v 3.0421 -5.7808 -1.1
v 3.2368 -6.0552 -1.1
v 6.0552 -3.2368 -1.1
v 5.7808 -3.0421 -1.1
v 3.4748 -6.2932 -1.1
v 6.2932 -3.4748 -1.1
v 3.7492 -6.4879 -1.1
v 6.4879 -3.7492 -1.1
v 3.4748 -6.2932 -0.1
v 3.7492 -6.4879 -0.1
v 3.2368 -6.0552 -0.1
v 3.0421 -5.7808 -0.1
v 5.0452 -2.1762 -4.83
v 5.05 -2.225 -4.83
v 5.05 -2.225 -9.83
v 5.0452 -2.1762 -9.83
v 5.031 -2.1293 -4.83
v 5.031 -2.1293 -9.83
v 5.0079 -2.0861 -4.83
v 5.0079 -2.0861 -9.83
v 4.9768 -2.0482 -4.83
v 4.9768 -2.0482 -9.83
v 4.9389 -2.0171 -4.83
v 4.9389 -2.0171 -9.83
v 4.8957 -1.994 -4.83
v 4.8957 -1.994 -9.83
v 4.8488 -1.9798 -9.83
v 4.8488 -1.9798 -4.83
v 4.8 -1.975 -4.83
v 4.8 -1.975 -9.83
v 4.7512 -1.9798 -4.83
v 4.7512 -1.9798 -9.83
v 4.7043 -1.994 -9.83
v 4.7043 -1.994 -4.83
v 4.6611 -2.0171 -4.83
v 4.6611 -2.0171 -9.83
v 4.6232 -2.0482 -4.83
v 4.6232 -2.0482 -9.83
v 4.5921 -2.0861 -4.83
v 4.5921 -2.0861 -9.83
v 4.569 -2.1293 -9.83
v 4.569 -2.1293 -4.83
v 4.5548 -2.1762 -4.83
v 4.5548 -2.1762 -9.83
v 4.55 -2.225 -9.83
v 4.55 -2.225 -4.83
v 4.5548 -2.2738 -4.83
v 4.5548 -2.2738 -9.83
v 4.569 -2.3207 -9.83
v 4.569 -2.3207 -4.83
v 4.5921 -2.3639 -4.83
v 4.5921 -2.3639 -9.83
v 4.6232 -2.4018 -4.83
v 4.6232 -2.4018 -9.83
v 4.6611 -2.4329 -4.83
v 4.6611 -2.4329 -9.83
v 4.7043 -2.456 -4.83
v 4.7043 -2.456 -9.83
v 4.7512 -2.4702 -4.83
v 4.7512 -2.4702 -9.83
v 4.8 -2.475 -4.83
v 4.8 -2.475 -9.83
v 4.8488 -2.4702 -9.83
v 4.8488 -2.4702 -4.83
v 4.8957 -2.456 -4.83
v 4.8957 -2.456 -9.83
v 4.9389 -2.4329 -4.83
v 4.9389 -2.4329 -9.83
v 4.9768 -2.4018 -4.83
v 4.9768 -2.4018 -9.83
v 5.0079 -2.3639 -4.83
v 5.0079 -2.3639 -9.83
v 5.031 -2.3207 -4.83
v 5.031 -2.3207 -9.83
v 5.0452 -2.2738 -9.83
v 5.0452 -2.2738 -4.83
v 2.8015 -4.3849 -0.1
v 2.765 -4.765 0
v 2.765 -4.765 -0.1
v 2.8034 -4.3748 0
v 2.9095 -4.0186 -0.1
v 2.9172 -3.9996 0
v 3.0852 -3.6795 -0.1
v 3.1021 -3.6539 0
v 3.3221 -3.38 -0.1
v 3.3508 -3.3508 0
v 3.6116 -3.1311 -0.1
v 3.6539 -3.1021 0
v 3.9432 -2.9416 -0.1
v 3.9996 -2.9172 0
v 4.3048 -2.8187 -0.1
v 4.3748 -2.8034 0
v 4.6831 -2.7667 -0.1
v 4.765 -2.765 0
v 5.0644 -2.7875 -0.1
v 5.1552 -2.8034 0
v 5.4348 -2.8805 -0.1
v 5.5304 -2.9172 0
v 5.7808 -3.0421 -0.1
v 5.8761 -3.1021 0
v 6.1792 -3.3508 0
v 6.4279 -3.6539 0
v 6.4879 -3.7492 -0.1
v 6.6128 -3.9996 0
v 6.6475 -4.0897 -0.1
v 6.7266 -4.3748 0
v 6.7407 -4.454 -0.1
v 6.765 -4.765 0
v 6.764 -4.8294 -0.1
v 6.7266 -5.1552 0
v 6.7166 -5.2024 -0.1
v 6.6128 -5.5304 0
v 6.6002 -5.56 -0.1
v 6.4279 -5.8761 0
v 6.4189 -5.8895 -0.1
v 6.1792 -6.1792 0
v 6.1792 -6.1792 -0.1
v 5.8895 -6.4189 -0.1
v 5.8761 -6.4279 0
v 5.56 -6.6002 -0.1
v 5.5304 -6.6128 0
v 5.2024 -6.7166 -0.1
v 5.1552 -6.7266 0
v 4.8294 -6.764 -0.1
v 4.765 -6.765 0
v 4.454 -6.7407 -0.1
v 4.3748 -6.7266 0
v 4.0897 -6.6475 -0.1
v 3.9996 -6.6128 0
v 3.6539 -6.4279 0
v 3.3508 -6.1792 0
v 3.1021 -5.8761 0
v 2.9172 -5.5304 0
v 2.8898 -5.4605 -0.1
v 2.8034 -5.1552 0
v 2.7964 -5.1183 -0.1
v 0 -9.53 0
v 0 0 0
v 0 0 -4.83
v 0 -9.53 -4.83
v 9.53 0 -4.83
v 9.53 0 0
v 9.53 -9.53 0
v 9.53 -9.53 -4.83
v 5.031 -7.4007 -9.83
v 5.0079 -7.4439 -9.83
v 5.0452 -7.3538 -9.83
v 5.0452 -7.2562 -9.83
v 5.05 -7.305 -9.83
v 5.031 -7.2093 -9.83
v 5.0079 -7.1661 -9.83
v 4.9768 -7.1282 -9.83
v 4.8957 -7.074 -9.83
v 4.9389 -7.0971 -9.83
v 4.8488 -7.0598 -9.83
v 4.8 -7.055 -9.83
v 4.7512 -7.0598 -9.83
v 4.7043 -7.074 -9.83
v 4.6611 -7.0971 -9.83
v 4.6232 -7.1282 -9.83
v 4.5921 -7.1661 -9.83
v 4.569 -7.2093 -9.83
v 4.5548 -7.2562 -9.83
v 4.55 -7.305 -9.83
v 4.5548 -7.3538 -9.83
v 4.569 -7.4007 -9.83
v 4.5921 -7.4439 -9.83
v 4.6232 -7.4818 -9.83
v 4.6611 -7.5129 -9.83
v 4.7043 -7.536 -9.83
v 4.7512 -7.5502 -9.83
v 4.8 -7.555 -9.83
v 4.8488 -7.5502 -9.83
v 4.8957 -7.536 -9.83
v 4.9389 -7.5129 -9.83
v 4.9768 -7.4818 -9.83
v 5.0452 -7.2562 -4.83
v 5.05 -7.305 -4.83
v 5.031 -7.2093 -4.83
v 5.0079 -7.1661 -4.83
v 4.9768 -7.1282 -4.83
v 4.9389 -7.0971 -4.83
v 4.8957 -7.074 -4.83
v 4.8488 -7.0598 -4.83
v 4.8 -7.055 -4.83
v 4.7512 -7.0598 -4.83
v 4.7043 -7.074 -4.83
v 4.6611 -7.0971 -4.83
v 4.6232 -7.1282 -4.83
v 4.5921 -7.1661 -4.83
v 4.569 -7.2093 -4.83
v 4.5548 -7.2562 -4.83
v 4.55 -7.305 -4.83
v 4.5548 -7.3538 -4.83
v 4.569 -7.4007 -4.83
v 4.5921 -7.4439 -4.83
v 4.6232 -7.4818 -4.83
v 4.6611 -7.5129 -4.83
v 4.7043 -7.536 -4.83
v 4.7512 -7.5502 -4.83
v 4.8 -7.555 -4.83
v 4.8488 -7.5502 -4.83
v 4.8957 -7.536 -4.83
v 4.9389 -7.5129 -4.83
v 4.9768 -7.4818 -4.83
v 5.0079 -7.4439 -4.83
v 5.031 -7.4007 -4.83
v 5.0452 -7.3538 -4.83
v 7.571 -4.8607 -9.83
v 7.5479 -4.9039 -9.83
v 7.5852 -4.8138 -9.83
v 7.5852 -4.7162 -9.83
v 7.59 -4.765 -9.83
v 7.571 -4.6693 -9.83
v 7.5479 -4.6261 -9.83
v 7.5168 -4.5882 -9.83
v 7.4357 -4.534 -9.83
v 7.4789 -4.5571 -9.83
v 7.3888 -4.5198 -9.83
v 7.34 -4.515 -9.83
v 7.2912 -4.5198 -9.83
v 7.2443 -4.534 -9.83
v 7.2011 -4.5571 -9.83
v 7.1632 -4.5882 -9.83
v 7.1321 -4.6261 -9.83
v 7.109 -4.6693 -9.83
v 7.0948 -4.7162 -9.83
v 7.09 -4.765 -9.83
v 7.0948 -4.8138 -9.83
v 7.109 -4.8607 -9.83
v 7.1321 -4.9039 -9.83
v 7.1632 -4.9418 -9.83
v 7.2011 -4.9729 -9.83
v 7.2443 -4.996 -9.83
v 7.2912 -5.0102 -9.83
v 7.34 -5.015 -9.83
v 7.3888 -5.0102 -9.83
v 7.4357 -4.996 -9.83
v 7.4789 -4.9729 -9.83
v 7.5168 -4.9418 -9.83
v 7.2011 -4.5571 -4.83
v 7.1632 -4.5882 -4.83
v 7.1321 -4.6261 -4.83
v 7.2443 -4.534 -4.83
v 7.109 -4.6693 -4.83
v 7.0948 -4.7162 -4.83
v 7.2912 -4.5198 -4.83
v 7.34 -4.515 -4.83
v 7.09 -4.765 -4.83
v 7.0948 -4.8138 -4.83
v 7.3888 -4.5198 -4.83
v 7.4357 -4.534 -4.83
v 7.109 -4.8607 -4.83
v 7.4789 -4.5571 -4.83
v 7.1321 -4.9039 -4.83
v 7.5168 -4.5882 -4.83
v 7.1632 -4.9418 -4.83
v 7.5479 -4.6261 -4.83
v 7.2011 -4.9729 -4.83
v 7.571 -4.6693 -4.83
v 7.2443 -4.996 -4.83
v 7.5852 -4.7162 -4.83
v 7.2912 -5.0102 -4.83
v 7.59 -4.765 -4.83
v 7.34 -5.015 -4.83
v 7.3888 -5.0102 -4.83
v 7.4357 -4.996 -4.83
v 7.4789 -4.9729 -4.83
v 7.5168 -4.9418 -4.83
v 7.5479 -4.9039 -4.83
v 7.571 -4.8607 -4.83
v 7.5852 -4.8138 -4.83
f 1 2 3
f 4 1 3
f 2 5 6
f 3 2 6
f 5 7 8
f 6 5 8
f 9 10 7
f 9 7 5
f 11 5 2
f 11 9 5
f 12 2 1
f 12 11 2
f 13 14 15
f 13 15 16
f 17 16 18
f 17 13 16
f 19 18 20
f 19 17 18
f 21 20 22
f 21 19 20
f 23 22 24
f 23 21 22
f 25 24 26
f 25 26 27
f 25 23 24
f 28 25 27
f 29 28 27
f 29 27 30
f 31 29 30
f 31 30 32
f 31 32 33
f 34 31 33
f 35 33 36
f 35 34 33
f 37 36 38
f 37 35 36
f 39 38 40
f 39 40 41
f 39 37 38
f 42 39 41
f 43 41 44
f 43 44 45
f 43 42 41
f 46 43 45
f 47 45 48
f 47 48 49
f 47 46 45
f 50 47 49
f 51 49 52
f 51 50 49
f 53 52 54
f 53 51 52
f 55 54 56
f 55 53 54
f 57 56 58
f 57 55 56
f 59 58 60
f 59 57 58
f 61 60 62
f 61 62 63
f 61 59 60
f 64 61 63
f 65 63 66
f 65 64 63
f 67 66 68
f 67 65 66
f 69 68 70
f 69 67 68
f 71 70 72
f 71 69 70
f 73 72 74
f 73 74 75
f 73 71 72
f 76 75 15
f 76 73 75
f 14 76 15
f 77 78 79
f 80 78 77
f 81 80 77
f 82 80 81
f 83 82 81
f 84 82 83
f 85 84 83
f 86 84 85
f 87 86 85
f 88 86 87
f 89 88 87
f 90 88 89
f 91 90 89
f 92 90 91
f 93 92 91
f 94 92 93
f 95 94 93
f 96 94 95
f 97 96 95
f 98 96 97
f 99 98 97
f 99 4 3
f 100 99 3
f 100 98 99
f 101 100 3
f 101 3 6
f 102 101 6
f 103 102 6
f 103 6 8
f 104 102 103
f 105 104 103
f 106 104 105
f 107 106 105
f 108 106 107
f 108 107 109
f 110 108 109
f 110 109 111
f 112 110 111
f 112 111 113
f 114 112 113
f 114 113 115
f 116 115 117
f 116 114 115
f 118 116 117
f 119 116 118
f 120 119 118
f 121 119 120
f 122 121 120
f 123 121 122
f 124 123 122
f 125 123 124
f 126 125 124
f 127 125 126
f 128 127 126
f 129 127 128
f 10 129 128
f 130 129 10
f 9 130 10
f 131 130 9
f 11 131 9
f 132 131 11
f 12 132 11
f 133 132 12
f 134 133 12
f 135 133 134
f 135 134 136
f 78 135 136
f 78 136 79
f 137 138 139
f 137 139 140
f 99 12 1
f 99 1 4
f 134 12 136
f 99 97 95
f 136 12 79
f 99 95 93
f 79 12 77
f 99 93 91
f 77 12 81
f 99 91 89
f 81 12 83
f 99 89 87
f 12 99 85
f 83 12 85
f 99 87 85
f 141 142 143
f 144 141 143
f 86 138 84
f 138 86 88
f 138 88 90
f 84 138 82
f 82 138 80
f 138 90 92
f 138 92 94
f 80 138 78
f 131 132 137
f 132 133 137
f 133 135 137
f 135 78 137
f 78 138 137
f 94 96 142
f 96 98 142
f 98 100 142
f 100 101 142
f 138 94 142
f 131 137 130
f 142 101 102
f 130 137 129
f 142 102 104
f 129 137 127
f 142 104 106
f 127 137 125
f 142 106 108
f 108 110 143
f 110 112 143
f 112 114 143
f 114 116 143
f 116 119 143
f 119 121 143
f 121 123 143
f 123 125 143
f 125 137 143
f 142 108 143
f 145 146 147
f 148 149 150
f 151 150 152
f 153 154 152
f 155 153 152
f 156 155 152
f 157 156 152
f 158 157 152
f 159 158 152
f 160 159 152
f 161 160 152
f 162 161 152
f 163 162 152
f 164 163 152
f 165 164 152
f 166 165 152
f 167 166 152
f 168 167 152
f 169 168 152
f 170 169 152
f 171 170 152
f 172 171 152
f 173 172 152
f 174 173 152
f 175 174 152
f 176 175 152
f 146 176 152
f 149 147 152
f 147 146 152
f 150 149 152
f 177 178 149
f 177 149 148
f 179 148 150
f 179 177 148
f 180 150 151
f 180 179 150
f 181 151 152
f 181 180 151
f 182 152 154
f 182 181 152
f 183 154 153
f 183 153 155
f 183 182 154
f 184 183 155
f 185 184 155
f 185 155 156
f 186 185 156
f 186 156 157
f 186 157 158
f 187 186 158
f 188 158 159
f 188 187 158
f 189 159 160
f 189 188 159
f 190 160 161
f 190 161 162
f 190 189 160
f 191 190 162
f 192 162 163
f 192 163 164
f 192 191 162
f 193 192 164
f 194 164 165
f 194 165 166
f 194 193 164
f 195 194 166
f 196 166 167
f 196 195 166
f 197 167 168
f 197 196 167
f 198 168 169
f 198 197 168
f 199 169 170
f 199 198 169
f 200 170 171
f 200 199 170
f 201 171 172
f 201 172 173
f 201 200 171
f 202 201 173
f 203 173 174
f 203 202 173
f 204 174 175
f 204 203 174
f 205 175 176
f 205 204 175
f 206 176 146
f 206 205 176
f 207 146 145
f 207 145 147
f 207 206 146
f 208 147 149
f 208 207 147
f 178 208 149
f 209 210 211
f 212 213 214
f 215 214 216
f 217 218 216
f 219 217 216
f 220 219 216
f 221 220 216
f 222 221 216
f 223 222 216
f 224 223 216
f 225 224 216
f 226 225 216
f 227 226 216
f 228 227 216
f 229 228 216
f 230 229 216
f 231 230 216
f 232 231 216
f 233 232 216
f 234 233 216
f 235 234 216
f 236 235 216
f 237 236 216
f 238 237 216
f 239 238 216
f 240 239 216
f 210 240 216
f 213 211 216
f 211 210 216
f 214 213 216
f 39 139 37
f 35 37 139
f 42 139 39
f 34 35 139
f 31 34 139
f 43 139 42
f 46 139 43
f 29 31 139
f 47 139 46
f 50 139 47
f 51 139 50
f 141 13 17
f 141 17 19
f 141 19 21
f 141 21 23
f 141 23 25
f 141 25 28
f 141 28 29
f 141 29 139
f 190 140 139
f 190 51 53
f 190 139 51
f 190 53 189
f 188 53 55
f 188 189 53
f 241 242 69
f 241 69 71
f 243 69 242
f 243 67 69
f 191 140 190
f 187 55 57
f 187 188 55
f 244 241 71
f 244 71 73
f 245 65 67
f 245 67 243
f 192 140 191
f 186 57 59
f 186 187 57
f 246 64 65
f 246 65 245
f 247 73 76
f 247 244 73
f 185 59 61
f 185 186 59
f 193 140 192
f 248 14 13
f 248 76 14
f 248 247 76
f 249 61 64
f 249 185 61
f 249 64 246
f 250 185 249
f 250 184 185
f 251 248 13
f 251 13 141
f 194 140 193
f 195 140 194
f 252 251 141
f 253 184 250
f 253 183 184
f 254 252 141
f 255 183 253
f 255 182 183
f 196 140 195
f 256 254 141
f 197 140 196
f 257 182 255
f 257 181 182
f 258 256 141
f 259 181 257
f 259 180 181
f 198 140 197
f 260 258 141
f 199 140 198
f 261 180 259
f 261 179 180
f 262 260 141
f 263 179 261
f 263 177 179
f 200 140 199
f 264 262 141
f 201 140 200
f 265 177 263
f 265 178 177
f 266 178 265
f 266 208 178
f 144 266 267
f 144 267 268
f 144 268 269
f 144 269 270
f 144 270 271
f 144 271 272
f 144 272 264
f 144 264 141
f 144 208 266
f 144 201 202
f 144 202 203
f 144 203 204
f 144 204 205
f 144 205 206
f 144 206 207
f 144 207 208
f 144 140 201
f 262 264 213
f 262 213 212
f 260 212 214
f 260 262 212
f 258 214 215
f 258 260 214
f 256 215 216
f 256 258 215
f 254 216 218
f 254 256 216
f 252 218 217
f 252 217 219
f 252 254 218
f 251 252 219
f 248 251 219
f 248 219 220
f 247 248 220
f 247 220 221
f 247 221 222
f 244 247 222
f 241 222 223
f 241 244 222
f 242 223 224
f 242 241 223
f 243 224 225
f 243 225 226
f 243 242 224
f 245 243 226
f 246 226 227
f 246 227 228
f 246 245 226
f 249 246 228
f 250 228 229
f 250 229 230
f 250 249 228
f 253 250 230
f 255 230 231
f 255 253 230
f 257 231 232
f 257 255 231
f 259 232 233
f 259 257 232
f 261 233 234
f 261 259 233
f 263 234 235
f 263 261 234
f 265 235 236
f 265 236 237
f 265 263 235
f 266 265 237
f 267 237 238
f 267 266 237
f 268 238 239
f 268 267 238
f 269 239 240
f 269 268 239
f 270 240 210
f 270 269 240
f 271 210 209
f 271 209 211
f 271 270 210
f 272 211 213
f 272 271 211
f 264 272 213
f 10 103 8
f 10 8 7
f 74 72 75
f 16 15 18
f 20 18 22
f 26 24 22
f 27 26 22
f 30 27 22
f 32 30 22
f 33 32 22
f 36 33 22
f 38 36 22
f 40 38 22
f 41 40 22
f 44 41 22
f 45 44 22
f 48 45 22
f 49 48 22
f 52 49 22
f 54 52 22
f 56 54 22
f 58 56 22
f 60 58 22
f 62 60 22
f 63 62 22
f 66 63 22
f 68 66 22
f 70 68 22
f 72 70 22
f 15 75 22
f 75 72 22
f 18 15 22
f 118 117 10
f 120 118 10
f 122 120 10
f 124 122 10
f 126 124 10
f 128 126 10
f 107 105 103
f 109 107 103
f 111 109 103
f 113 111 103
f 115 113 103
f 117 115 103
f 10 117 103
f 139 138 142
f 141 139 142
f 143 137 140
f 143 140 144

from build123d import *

# Parameters (mm, degrees)
SKETCH1_W           = 9.53
SKETCH1_H           = 9.53
BASIC_SHAPE_DEPTH   = 4.83
SKETCH2_R           = 0.25
PINS_DEPTH          = 5
SKETCH3_R           = 2
ADJUSTER_DEPTH      = 0.1
ADJUSTER_SLOT_DEPTH = 1


with BuildPart() as part:
    # Sketch1 → Basic Shape (new body)
    with BuildSketch(Plane(origin=(0, 0, 0), x_dir=(1, 0, 0), z_dir=(0, 0, -1))):
        with Locations((4.765, 4.765)):
            Rectangle(SKETCH1_W, SKETCH1_H)
    extrude(amount=BASIC_SHAPE_DEPTH)

    # Sketch2 → Pins (add)
    with BuildSketch(Plane.XY.offset(-4.83)):
        with Locations((4.8, -7.305)):
            Circle(SKETCH2_R)
        with Locations((4.8, -2.225)):
            Circle(SKETCH2_R)
        with Locations((7.34, -4.765)):
            Circle(SKETCH2_R)
    extrude(amount=-PINS_DEPTH)

    # Sketch3 → Adjuster (cut)
    with BuildSketch(Plane(origin=(0, 0, 0), x_dir=(-1, 0, 0), z_dir=(0, 0, -1))):
        with Locations((-4.765, -4.765)):
            Circle(SKETCH3_R)
    extrude(amount=ADJUSTER_DEPTH, mode=Mode.SUBTRACT)

    # Sketch4 → Adjuster Slot (cut)
    with BuildSketch(Plane(origin=(0, 0, -0.1), x_dir=(-1, 0, 0), z_dir=(0, 0, 1))):
        with BuildLine():
            Line((-6.487859784, 3.749246997), (-3.749246997, 6.487859784))
            ThreePointArc((-3.749246997, 6.487859784), (-3.350786438, 6.179213562), (-3.042140216, 5.780753003))
            Line((-3.042140216, 5.780753003), (-5.780753003, 3.042140216))
            ThreePointArc((-5.780753003, 3.042140216), (-6.179213562, 3.350786438), (-6.487859784, 3.749246997))
        make_face()
    extrude(amount=-ADJUSTER_SLOT_DEPTH, mode=Mode.SUBTRACT)


solid = part.part
